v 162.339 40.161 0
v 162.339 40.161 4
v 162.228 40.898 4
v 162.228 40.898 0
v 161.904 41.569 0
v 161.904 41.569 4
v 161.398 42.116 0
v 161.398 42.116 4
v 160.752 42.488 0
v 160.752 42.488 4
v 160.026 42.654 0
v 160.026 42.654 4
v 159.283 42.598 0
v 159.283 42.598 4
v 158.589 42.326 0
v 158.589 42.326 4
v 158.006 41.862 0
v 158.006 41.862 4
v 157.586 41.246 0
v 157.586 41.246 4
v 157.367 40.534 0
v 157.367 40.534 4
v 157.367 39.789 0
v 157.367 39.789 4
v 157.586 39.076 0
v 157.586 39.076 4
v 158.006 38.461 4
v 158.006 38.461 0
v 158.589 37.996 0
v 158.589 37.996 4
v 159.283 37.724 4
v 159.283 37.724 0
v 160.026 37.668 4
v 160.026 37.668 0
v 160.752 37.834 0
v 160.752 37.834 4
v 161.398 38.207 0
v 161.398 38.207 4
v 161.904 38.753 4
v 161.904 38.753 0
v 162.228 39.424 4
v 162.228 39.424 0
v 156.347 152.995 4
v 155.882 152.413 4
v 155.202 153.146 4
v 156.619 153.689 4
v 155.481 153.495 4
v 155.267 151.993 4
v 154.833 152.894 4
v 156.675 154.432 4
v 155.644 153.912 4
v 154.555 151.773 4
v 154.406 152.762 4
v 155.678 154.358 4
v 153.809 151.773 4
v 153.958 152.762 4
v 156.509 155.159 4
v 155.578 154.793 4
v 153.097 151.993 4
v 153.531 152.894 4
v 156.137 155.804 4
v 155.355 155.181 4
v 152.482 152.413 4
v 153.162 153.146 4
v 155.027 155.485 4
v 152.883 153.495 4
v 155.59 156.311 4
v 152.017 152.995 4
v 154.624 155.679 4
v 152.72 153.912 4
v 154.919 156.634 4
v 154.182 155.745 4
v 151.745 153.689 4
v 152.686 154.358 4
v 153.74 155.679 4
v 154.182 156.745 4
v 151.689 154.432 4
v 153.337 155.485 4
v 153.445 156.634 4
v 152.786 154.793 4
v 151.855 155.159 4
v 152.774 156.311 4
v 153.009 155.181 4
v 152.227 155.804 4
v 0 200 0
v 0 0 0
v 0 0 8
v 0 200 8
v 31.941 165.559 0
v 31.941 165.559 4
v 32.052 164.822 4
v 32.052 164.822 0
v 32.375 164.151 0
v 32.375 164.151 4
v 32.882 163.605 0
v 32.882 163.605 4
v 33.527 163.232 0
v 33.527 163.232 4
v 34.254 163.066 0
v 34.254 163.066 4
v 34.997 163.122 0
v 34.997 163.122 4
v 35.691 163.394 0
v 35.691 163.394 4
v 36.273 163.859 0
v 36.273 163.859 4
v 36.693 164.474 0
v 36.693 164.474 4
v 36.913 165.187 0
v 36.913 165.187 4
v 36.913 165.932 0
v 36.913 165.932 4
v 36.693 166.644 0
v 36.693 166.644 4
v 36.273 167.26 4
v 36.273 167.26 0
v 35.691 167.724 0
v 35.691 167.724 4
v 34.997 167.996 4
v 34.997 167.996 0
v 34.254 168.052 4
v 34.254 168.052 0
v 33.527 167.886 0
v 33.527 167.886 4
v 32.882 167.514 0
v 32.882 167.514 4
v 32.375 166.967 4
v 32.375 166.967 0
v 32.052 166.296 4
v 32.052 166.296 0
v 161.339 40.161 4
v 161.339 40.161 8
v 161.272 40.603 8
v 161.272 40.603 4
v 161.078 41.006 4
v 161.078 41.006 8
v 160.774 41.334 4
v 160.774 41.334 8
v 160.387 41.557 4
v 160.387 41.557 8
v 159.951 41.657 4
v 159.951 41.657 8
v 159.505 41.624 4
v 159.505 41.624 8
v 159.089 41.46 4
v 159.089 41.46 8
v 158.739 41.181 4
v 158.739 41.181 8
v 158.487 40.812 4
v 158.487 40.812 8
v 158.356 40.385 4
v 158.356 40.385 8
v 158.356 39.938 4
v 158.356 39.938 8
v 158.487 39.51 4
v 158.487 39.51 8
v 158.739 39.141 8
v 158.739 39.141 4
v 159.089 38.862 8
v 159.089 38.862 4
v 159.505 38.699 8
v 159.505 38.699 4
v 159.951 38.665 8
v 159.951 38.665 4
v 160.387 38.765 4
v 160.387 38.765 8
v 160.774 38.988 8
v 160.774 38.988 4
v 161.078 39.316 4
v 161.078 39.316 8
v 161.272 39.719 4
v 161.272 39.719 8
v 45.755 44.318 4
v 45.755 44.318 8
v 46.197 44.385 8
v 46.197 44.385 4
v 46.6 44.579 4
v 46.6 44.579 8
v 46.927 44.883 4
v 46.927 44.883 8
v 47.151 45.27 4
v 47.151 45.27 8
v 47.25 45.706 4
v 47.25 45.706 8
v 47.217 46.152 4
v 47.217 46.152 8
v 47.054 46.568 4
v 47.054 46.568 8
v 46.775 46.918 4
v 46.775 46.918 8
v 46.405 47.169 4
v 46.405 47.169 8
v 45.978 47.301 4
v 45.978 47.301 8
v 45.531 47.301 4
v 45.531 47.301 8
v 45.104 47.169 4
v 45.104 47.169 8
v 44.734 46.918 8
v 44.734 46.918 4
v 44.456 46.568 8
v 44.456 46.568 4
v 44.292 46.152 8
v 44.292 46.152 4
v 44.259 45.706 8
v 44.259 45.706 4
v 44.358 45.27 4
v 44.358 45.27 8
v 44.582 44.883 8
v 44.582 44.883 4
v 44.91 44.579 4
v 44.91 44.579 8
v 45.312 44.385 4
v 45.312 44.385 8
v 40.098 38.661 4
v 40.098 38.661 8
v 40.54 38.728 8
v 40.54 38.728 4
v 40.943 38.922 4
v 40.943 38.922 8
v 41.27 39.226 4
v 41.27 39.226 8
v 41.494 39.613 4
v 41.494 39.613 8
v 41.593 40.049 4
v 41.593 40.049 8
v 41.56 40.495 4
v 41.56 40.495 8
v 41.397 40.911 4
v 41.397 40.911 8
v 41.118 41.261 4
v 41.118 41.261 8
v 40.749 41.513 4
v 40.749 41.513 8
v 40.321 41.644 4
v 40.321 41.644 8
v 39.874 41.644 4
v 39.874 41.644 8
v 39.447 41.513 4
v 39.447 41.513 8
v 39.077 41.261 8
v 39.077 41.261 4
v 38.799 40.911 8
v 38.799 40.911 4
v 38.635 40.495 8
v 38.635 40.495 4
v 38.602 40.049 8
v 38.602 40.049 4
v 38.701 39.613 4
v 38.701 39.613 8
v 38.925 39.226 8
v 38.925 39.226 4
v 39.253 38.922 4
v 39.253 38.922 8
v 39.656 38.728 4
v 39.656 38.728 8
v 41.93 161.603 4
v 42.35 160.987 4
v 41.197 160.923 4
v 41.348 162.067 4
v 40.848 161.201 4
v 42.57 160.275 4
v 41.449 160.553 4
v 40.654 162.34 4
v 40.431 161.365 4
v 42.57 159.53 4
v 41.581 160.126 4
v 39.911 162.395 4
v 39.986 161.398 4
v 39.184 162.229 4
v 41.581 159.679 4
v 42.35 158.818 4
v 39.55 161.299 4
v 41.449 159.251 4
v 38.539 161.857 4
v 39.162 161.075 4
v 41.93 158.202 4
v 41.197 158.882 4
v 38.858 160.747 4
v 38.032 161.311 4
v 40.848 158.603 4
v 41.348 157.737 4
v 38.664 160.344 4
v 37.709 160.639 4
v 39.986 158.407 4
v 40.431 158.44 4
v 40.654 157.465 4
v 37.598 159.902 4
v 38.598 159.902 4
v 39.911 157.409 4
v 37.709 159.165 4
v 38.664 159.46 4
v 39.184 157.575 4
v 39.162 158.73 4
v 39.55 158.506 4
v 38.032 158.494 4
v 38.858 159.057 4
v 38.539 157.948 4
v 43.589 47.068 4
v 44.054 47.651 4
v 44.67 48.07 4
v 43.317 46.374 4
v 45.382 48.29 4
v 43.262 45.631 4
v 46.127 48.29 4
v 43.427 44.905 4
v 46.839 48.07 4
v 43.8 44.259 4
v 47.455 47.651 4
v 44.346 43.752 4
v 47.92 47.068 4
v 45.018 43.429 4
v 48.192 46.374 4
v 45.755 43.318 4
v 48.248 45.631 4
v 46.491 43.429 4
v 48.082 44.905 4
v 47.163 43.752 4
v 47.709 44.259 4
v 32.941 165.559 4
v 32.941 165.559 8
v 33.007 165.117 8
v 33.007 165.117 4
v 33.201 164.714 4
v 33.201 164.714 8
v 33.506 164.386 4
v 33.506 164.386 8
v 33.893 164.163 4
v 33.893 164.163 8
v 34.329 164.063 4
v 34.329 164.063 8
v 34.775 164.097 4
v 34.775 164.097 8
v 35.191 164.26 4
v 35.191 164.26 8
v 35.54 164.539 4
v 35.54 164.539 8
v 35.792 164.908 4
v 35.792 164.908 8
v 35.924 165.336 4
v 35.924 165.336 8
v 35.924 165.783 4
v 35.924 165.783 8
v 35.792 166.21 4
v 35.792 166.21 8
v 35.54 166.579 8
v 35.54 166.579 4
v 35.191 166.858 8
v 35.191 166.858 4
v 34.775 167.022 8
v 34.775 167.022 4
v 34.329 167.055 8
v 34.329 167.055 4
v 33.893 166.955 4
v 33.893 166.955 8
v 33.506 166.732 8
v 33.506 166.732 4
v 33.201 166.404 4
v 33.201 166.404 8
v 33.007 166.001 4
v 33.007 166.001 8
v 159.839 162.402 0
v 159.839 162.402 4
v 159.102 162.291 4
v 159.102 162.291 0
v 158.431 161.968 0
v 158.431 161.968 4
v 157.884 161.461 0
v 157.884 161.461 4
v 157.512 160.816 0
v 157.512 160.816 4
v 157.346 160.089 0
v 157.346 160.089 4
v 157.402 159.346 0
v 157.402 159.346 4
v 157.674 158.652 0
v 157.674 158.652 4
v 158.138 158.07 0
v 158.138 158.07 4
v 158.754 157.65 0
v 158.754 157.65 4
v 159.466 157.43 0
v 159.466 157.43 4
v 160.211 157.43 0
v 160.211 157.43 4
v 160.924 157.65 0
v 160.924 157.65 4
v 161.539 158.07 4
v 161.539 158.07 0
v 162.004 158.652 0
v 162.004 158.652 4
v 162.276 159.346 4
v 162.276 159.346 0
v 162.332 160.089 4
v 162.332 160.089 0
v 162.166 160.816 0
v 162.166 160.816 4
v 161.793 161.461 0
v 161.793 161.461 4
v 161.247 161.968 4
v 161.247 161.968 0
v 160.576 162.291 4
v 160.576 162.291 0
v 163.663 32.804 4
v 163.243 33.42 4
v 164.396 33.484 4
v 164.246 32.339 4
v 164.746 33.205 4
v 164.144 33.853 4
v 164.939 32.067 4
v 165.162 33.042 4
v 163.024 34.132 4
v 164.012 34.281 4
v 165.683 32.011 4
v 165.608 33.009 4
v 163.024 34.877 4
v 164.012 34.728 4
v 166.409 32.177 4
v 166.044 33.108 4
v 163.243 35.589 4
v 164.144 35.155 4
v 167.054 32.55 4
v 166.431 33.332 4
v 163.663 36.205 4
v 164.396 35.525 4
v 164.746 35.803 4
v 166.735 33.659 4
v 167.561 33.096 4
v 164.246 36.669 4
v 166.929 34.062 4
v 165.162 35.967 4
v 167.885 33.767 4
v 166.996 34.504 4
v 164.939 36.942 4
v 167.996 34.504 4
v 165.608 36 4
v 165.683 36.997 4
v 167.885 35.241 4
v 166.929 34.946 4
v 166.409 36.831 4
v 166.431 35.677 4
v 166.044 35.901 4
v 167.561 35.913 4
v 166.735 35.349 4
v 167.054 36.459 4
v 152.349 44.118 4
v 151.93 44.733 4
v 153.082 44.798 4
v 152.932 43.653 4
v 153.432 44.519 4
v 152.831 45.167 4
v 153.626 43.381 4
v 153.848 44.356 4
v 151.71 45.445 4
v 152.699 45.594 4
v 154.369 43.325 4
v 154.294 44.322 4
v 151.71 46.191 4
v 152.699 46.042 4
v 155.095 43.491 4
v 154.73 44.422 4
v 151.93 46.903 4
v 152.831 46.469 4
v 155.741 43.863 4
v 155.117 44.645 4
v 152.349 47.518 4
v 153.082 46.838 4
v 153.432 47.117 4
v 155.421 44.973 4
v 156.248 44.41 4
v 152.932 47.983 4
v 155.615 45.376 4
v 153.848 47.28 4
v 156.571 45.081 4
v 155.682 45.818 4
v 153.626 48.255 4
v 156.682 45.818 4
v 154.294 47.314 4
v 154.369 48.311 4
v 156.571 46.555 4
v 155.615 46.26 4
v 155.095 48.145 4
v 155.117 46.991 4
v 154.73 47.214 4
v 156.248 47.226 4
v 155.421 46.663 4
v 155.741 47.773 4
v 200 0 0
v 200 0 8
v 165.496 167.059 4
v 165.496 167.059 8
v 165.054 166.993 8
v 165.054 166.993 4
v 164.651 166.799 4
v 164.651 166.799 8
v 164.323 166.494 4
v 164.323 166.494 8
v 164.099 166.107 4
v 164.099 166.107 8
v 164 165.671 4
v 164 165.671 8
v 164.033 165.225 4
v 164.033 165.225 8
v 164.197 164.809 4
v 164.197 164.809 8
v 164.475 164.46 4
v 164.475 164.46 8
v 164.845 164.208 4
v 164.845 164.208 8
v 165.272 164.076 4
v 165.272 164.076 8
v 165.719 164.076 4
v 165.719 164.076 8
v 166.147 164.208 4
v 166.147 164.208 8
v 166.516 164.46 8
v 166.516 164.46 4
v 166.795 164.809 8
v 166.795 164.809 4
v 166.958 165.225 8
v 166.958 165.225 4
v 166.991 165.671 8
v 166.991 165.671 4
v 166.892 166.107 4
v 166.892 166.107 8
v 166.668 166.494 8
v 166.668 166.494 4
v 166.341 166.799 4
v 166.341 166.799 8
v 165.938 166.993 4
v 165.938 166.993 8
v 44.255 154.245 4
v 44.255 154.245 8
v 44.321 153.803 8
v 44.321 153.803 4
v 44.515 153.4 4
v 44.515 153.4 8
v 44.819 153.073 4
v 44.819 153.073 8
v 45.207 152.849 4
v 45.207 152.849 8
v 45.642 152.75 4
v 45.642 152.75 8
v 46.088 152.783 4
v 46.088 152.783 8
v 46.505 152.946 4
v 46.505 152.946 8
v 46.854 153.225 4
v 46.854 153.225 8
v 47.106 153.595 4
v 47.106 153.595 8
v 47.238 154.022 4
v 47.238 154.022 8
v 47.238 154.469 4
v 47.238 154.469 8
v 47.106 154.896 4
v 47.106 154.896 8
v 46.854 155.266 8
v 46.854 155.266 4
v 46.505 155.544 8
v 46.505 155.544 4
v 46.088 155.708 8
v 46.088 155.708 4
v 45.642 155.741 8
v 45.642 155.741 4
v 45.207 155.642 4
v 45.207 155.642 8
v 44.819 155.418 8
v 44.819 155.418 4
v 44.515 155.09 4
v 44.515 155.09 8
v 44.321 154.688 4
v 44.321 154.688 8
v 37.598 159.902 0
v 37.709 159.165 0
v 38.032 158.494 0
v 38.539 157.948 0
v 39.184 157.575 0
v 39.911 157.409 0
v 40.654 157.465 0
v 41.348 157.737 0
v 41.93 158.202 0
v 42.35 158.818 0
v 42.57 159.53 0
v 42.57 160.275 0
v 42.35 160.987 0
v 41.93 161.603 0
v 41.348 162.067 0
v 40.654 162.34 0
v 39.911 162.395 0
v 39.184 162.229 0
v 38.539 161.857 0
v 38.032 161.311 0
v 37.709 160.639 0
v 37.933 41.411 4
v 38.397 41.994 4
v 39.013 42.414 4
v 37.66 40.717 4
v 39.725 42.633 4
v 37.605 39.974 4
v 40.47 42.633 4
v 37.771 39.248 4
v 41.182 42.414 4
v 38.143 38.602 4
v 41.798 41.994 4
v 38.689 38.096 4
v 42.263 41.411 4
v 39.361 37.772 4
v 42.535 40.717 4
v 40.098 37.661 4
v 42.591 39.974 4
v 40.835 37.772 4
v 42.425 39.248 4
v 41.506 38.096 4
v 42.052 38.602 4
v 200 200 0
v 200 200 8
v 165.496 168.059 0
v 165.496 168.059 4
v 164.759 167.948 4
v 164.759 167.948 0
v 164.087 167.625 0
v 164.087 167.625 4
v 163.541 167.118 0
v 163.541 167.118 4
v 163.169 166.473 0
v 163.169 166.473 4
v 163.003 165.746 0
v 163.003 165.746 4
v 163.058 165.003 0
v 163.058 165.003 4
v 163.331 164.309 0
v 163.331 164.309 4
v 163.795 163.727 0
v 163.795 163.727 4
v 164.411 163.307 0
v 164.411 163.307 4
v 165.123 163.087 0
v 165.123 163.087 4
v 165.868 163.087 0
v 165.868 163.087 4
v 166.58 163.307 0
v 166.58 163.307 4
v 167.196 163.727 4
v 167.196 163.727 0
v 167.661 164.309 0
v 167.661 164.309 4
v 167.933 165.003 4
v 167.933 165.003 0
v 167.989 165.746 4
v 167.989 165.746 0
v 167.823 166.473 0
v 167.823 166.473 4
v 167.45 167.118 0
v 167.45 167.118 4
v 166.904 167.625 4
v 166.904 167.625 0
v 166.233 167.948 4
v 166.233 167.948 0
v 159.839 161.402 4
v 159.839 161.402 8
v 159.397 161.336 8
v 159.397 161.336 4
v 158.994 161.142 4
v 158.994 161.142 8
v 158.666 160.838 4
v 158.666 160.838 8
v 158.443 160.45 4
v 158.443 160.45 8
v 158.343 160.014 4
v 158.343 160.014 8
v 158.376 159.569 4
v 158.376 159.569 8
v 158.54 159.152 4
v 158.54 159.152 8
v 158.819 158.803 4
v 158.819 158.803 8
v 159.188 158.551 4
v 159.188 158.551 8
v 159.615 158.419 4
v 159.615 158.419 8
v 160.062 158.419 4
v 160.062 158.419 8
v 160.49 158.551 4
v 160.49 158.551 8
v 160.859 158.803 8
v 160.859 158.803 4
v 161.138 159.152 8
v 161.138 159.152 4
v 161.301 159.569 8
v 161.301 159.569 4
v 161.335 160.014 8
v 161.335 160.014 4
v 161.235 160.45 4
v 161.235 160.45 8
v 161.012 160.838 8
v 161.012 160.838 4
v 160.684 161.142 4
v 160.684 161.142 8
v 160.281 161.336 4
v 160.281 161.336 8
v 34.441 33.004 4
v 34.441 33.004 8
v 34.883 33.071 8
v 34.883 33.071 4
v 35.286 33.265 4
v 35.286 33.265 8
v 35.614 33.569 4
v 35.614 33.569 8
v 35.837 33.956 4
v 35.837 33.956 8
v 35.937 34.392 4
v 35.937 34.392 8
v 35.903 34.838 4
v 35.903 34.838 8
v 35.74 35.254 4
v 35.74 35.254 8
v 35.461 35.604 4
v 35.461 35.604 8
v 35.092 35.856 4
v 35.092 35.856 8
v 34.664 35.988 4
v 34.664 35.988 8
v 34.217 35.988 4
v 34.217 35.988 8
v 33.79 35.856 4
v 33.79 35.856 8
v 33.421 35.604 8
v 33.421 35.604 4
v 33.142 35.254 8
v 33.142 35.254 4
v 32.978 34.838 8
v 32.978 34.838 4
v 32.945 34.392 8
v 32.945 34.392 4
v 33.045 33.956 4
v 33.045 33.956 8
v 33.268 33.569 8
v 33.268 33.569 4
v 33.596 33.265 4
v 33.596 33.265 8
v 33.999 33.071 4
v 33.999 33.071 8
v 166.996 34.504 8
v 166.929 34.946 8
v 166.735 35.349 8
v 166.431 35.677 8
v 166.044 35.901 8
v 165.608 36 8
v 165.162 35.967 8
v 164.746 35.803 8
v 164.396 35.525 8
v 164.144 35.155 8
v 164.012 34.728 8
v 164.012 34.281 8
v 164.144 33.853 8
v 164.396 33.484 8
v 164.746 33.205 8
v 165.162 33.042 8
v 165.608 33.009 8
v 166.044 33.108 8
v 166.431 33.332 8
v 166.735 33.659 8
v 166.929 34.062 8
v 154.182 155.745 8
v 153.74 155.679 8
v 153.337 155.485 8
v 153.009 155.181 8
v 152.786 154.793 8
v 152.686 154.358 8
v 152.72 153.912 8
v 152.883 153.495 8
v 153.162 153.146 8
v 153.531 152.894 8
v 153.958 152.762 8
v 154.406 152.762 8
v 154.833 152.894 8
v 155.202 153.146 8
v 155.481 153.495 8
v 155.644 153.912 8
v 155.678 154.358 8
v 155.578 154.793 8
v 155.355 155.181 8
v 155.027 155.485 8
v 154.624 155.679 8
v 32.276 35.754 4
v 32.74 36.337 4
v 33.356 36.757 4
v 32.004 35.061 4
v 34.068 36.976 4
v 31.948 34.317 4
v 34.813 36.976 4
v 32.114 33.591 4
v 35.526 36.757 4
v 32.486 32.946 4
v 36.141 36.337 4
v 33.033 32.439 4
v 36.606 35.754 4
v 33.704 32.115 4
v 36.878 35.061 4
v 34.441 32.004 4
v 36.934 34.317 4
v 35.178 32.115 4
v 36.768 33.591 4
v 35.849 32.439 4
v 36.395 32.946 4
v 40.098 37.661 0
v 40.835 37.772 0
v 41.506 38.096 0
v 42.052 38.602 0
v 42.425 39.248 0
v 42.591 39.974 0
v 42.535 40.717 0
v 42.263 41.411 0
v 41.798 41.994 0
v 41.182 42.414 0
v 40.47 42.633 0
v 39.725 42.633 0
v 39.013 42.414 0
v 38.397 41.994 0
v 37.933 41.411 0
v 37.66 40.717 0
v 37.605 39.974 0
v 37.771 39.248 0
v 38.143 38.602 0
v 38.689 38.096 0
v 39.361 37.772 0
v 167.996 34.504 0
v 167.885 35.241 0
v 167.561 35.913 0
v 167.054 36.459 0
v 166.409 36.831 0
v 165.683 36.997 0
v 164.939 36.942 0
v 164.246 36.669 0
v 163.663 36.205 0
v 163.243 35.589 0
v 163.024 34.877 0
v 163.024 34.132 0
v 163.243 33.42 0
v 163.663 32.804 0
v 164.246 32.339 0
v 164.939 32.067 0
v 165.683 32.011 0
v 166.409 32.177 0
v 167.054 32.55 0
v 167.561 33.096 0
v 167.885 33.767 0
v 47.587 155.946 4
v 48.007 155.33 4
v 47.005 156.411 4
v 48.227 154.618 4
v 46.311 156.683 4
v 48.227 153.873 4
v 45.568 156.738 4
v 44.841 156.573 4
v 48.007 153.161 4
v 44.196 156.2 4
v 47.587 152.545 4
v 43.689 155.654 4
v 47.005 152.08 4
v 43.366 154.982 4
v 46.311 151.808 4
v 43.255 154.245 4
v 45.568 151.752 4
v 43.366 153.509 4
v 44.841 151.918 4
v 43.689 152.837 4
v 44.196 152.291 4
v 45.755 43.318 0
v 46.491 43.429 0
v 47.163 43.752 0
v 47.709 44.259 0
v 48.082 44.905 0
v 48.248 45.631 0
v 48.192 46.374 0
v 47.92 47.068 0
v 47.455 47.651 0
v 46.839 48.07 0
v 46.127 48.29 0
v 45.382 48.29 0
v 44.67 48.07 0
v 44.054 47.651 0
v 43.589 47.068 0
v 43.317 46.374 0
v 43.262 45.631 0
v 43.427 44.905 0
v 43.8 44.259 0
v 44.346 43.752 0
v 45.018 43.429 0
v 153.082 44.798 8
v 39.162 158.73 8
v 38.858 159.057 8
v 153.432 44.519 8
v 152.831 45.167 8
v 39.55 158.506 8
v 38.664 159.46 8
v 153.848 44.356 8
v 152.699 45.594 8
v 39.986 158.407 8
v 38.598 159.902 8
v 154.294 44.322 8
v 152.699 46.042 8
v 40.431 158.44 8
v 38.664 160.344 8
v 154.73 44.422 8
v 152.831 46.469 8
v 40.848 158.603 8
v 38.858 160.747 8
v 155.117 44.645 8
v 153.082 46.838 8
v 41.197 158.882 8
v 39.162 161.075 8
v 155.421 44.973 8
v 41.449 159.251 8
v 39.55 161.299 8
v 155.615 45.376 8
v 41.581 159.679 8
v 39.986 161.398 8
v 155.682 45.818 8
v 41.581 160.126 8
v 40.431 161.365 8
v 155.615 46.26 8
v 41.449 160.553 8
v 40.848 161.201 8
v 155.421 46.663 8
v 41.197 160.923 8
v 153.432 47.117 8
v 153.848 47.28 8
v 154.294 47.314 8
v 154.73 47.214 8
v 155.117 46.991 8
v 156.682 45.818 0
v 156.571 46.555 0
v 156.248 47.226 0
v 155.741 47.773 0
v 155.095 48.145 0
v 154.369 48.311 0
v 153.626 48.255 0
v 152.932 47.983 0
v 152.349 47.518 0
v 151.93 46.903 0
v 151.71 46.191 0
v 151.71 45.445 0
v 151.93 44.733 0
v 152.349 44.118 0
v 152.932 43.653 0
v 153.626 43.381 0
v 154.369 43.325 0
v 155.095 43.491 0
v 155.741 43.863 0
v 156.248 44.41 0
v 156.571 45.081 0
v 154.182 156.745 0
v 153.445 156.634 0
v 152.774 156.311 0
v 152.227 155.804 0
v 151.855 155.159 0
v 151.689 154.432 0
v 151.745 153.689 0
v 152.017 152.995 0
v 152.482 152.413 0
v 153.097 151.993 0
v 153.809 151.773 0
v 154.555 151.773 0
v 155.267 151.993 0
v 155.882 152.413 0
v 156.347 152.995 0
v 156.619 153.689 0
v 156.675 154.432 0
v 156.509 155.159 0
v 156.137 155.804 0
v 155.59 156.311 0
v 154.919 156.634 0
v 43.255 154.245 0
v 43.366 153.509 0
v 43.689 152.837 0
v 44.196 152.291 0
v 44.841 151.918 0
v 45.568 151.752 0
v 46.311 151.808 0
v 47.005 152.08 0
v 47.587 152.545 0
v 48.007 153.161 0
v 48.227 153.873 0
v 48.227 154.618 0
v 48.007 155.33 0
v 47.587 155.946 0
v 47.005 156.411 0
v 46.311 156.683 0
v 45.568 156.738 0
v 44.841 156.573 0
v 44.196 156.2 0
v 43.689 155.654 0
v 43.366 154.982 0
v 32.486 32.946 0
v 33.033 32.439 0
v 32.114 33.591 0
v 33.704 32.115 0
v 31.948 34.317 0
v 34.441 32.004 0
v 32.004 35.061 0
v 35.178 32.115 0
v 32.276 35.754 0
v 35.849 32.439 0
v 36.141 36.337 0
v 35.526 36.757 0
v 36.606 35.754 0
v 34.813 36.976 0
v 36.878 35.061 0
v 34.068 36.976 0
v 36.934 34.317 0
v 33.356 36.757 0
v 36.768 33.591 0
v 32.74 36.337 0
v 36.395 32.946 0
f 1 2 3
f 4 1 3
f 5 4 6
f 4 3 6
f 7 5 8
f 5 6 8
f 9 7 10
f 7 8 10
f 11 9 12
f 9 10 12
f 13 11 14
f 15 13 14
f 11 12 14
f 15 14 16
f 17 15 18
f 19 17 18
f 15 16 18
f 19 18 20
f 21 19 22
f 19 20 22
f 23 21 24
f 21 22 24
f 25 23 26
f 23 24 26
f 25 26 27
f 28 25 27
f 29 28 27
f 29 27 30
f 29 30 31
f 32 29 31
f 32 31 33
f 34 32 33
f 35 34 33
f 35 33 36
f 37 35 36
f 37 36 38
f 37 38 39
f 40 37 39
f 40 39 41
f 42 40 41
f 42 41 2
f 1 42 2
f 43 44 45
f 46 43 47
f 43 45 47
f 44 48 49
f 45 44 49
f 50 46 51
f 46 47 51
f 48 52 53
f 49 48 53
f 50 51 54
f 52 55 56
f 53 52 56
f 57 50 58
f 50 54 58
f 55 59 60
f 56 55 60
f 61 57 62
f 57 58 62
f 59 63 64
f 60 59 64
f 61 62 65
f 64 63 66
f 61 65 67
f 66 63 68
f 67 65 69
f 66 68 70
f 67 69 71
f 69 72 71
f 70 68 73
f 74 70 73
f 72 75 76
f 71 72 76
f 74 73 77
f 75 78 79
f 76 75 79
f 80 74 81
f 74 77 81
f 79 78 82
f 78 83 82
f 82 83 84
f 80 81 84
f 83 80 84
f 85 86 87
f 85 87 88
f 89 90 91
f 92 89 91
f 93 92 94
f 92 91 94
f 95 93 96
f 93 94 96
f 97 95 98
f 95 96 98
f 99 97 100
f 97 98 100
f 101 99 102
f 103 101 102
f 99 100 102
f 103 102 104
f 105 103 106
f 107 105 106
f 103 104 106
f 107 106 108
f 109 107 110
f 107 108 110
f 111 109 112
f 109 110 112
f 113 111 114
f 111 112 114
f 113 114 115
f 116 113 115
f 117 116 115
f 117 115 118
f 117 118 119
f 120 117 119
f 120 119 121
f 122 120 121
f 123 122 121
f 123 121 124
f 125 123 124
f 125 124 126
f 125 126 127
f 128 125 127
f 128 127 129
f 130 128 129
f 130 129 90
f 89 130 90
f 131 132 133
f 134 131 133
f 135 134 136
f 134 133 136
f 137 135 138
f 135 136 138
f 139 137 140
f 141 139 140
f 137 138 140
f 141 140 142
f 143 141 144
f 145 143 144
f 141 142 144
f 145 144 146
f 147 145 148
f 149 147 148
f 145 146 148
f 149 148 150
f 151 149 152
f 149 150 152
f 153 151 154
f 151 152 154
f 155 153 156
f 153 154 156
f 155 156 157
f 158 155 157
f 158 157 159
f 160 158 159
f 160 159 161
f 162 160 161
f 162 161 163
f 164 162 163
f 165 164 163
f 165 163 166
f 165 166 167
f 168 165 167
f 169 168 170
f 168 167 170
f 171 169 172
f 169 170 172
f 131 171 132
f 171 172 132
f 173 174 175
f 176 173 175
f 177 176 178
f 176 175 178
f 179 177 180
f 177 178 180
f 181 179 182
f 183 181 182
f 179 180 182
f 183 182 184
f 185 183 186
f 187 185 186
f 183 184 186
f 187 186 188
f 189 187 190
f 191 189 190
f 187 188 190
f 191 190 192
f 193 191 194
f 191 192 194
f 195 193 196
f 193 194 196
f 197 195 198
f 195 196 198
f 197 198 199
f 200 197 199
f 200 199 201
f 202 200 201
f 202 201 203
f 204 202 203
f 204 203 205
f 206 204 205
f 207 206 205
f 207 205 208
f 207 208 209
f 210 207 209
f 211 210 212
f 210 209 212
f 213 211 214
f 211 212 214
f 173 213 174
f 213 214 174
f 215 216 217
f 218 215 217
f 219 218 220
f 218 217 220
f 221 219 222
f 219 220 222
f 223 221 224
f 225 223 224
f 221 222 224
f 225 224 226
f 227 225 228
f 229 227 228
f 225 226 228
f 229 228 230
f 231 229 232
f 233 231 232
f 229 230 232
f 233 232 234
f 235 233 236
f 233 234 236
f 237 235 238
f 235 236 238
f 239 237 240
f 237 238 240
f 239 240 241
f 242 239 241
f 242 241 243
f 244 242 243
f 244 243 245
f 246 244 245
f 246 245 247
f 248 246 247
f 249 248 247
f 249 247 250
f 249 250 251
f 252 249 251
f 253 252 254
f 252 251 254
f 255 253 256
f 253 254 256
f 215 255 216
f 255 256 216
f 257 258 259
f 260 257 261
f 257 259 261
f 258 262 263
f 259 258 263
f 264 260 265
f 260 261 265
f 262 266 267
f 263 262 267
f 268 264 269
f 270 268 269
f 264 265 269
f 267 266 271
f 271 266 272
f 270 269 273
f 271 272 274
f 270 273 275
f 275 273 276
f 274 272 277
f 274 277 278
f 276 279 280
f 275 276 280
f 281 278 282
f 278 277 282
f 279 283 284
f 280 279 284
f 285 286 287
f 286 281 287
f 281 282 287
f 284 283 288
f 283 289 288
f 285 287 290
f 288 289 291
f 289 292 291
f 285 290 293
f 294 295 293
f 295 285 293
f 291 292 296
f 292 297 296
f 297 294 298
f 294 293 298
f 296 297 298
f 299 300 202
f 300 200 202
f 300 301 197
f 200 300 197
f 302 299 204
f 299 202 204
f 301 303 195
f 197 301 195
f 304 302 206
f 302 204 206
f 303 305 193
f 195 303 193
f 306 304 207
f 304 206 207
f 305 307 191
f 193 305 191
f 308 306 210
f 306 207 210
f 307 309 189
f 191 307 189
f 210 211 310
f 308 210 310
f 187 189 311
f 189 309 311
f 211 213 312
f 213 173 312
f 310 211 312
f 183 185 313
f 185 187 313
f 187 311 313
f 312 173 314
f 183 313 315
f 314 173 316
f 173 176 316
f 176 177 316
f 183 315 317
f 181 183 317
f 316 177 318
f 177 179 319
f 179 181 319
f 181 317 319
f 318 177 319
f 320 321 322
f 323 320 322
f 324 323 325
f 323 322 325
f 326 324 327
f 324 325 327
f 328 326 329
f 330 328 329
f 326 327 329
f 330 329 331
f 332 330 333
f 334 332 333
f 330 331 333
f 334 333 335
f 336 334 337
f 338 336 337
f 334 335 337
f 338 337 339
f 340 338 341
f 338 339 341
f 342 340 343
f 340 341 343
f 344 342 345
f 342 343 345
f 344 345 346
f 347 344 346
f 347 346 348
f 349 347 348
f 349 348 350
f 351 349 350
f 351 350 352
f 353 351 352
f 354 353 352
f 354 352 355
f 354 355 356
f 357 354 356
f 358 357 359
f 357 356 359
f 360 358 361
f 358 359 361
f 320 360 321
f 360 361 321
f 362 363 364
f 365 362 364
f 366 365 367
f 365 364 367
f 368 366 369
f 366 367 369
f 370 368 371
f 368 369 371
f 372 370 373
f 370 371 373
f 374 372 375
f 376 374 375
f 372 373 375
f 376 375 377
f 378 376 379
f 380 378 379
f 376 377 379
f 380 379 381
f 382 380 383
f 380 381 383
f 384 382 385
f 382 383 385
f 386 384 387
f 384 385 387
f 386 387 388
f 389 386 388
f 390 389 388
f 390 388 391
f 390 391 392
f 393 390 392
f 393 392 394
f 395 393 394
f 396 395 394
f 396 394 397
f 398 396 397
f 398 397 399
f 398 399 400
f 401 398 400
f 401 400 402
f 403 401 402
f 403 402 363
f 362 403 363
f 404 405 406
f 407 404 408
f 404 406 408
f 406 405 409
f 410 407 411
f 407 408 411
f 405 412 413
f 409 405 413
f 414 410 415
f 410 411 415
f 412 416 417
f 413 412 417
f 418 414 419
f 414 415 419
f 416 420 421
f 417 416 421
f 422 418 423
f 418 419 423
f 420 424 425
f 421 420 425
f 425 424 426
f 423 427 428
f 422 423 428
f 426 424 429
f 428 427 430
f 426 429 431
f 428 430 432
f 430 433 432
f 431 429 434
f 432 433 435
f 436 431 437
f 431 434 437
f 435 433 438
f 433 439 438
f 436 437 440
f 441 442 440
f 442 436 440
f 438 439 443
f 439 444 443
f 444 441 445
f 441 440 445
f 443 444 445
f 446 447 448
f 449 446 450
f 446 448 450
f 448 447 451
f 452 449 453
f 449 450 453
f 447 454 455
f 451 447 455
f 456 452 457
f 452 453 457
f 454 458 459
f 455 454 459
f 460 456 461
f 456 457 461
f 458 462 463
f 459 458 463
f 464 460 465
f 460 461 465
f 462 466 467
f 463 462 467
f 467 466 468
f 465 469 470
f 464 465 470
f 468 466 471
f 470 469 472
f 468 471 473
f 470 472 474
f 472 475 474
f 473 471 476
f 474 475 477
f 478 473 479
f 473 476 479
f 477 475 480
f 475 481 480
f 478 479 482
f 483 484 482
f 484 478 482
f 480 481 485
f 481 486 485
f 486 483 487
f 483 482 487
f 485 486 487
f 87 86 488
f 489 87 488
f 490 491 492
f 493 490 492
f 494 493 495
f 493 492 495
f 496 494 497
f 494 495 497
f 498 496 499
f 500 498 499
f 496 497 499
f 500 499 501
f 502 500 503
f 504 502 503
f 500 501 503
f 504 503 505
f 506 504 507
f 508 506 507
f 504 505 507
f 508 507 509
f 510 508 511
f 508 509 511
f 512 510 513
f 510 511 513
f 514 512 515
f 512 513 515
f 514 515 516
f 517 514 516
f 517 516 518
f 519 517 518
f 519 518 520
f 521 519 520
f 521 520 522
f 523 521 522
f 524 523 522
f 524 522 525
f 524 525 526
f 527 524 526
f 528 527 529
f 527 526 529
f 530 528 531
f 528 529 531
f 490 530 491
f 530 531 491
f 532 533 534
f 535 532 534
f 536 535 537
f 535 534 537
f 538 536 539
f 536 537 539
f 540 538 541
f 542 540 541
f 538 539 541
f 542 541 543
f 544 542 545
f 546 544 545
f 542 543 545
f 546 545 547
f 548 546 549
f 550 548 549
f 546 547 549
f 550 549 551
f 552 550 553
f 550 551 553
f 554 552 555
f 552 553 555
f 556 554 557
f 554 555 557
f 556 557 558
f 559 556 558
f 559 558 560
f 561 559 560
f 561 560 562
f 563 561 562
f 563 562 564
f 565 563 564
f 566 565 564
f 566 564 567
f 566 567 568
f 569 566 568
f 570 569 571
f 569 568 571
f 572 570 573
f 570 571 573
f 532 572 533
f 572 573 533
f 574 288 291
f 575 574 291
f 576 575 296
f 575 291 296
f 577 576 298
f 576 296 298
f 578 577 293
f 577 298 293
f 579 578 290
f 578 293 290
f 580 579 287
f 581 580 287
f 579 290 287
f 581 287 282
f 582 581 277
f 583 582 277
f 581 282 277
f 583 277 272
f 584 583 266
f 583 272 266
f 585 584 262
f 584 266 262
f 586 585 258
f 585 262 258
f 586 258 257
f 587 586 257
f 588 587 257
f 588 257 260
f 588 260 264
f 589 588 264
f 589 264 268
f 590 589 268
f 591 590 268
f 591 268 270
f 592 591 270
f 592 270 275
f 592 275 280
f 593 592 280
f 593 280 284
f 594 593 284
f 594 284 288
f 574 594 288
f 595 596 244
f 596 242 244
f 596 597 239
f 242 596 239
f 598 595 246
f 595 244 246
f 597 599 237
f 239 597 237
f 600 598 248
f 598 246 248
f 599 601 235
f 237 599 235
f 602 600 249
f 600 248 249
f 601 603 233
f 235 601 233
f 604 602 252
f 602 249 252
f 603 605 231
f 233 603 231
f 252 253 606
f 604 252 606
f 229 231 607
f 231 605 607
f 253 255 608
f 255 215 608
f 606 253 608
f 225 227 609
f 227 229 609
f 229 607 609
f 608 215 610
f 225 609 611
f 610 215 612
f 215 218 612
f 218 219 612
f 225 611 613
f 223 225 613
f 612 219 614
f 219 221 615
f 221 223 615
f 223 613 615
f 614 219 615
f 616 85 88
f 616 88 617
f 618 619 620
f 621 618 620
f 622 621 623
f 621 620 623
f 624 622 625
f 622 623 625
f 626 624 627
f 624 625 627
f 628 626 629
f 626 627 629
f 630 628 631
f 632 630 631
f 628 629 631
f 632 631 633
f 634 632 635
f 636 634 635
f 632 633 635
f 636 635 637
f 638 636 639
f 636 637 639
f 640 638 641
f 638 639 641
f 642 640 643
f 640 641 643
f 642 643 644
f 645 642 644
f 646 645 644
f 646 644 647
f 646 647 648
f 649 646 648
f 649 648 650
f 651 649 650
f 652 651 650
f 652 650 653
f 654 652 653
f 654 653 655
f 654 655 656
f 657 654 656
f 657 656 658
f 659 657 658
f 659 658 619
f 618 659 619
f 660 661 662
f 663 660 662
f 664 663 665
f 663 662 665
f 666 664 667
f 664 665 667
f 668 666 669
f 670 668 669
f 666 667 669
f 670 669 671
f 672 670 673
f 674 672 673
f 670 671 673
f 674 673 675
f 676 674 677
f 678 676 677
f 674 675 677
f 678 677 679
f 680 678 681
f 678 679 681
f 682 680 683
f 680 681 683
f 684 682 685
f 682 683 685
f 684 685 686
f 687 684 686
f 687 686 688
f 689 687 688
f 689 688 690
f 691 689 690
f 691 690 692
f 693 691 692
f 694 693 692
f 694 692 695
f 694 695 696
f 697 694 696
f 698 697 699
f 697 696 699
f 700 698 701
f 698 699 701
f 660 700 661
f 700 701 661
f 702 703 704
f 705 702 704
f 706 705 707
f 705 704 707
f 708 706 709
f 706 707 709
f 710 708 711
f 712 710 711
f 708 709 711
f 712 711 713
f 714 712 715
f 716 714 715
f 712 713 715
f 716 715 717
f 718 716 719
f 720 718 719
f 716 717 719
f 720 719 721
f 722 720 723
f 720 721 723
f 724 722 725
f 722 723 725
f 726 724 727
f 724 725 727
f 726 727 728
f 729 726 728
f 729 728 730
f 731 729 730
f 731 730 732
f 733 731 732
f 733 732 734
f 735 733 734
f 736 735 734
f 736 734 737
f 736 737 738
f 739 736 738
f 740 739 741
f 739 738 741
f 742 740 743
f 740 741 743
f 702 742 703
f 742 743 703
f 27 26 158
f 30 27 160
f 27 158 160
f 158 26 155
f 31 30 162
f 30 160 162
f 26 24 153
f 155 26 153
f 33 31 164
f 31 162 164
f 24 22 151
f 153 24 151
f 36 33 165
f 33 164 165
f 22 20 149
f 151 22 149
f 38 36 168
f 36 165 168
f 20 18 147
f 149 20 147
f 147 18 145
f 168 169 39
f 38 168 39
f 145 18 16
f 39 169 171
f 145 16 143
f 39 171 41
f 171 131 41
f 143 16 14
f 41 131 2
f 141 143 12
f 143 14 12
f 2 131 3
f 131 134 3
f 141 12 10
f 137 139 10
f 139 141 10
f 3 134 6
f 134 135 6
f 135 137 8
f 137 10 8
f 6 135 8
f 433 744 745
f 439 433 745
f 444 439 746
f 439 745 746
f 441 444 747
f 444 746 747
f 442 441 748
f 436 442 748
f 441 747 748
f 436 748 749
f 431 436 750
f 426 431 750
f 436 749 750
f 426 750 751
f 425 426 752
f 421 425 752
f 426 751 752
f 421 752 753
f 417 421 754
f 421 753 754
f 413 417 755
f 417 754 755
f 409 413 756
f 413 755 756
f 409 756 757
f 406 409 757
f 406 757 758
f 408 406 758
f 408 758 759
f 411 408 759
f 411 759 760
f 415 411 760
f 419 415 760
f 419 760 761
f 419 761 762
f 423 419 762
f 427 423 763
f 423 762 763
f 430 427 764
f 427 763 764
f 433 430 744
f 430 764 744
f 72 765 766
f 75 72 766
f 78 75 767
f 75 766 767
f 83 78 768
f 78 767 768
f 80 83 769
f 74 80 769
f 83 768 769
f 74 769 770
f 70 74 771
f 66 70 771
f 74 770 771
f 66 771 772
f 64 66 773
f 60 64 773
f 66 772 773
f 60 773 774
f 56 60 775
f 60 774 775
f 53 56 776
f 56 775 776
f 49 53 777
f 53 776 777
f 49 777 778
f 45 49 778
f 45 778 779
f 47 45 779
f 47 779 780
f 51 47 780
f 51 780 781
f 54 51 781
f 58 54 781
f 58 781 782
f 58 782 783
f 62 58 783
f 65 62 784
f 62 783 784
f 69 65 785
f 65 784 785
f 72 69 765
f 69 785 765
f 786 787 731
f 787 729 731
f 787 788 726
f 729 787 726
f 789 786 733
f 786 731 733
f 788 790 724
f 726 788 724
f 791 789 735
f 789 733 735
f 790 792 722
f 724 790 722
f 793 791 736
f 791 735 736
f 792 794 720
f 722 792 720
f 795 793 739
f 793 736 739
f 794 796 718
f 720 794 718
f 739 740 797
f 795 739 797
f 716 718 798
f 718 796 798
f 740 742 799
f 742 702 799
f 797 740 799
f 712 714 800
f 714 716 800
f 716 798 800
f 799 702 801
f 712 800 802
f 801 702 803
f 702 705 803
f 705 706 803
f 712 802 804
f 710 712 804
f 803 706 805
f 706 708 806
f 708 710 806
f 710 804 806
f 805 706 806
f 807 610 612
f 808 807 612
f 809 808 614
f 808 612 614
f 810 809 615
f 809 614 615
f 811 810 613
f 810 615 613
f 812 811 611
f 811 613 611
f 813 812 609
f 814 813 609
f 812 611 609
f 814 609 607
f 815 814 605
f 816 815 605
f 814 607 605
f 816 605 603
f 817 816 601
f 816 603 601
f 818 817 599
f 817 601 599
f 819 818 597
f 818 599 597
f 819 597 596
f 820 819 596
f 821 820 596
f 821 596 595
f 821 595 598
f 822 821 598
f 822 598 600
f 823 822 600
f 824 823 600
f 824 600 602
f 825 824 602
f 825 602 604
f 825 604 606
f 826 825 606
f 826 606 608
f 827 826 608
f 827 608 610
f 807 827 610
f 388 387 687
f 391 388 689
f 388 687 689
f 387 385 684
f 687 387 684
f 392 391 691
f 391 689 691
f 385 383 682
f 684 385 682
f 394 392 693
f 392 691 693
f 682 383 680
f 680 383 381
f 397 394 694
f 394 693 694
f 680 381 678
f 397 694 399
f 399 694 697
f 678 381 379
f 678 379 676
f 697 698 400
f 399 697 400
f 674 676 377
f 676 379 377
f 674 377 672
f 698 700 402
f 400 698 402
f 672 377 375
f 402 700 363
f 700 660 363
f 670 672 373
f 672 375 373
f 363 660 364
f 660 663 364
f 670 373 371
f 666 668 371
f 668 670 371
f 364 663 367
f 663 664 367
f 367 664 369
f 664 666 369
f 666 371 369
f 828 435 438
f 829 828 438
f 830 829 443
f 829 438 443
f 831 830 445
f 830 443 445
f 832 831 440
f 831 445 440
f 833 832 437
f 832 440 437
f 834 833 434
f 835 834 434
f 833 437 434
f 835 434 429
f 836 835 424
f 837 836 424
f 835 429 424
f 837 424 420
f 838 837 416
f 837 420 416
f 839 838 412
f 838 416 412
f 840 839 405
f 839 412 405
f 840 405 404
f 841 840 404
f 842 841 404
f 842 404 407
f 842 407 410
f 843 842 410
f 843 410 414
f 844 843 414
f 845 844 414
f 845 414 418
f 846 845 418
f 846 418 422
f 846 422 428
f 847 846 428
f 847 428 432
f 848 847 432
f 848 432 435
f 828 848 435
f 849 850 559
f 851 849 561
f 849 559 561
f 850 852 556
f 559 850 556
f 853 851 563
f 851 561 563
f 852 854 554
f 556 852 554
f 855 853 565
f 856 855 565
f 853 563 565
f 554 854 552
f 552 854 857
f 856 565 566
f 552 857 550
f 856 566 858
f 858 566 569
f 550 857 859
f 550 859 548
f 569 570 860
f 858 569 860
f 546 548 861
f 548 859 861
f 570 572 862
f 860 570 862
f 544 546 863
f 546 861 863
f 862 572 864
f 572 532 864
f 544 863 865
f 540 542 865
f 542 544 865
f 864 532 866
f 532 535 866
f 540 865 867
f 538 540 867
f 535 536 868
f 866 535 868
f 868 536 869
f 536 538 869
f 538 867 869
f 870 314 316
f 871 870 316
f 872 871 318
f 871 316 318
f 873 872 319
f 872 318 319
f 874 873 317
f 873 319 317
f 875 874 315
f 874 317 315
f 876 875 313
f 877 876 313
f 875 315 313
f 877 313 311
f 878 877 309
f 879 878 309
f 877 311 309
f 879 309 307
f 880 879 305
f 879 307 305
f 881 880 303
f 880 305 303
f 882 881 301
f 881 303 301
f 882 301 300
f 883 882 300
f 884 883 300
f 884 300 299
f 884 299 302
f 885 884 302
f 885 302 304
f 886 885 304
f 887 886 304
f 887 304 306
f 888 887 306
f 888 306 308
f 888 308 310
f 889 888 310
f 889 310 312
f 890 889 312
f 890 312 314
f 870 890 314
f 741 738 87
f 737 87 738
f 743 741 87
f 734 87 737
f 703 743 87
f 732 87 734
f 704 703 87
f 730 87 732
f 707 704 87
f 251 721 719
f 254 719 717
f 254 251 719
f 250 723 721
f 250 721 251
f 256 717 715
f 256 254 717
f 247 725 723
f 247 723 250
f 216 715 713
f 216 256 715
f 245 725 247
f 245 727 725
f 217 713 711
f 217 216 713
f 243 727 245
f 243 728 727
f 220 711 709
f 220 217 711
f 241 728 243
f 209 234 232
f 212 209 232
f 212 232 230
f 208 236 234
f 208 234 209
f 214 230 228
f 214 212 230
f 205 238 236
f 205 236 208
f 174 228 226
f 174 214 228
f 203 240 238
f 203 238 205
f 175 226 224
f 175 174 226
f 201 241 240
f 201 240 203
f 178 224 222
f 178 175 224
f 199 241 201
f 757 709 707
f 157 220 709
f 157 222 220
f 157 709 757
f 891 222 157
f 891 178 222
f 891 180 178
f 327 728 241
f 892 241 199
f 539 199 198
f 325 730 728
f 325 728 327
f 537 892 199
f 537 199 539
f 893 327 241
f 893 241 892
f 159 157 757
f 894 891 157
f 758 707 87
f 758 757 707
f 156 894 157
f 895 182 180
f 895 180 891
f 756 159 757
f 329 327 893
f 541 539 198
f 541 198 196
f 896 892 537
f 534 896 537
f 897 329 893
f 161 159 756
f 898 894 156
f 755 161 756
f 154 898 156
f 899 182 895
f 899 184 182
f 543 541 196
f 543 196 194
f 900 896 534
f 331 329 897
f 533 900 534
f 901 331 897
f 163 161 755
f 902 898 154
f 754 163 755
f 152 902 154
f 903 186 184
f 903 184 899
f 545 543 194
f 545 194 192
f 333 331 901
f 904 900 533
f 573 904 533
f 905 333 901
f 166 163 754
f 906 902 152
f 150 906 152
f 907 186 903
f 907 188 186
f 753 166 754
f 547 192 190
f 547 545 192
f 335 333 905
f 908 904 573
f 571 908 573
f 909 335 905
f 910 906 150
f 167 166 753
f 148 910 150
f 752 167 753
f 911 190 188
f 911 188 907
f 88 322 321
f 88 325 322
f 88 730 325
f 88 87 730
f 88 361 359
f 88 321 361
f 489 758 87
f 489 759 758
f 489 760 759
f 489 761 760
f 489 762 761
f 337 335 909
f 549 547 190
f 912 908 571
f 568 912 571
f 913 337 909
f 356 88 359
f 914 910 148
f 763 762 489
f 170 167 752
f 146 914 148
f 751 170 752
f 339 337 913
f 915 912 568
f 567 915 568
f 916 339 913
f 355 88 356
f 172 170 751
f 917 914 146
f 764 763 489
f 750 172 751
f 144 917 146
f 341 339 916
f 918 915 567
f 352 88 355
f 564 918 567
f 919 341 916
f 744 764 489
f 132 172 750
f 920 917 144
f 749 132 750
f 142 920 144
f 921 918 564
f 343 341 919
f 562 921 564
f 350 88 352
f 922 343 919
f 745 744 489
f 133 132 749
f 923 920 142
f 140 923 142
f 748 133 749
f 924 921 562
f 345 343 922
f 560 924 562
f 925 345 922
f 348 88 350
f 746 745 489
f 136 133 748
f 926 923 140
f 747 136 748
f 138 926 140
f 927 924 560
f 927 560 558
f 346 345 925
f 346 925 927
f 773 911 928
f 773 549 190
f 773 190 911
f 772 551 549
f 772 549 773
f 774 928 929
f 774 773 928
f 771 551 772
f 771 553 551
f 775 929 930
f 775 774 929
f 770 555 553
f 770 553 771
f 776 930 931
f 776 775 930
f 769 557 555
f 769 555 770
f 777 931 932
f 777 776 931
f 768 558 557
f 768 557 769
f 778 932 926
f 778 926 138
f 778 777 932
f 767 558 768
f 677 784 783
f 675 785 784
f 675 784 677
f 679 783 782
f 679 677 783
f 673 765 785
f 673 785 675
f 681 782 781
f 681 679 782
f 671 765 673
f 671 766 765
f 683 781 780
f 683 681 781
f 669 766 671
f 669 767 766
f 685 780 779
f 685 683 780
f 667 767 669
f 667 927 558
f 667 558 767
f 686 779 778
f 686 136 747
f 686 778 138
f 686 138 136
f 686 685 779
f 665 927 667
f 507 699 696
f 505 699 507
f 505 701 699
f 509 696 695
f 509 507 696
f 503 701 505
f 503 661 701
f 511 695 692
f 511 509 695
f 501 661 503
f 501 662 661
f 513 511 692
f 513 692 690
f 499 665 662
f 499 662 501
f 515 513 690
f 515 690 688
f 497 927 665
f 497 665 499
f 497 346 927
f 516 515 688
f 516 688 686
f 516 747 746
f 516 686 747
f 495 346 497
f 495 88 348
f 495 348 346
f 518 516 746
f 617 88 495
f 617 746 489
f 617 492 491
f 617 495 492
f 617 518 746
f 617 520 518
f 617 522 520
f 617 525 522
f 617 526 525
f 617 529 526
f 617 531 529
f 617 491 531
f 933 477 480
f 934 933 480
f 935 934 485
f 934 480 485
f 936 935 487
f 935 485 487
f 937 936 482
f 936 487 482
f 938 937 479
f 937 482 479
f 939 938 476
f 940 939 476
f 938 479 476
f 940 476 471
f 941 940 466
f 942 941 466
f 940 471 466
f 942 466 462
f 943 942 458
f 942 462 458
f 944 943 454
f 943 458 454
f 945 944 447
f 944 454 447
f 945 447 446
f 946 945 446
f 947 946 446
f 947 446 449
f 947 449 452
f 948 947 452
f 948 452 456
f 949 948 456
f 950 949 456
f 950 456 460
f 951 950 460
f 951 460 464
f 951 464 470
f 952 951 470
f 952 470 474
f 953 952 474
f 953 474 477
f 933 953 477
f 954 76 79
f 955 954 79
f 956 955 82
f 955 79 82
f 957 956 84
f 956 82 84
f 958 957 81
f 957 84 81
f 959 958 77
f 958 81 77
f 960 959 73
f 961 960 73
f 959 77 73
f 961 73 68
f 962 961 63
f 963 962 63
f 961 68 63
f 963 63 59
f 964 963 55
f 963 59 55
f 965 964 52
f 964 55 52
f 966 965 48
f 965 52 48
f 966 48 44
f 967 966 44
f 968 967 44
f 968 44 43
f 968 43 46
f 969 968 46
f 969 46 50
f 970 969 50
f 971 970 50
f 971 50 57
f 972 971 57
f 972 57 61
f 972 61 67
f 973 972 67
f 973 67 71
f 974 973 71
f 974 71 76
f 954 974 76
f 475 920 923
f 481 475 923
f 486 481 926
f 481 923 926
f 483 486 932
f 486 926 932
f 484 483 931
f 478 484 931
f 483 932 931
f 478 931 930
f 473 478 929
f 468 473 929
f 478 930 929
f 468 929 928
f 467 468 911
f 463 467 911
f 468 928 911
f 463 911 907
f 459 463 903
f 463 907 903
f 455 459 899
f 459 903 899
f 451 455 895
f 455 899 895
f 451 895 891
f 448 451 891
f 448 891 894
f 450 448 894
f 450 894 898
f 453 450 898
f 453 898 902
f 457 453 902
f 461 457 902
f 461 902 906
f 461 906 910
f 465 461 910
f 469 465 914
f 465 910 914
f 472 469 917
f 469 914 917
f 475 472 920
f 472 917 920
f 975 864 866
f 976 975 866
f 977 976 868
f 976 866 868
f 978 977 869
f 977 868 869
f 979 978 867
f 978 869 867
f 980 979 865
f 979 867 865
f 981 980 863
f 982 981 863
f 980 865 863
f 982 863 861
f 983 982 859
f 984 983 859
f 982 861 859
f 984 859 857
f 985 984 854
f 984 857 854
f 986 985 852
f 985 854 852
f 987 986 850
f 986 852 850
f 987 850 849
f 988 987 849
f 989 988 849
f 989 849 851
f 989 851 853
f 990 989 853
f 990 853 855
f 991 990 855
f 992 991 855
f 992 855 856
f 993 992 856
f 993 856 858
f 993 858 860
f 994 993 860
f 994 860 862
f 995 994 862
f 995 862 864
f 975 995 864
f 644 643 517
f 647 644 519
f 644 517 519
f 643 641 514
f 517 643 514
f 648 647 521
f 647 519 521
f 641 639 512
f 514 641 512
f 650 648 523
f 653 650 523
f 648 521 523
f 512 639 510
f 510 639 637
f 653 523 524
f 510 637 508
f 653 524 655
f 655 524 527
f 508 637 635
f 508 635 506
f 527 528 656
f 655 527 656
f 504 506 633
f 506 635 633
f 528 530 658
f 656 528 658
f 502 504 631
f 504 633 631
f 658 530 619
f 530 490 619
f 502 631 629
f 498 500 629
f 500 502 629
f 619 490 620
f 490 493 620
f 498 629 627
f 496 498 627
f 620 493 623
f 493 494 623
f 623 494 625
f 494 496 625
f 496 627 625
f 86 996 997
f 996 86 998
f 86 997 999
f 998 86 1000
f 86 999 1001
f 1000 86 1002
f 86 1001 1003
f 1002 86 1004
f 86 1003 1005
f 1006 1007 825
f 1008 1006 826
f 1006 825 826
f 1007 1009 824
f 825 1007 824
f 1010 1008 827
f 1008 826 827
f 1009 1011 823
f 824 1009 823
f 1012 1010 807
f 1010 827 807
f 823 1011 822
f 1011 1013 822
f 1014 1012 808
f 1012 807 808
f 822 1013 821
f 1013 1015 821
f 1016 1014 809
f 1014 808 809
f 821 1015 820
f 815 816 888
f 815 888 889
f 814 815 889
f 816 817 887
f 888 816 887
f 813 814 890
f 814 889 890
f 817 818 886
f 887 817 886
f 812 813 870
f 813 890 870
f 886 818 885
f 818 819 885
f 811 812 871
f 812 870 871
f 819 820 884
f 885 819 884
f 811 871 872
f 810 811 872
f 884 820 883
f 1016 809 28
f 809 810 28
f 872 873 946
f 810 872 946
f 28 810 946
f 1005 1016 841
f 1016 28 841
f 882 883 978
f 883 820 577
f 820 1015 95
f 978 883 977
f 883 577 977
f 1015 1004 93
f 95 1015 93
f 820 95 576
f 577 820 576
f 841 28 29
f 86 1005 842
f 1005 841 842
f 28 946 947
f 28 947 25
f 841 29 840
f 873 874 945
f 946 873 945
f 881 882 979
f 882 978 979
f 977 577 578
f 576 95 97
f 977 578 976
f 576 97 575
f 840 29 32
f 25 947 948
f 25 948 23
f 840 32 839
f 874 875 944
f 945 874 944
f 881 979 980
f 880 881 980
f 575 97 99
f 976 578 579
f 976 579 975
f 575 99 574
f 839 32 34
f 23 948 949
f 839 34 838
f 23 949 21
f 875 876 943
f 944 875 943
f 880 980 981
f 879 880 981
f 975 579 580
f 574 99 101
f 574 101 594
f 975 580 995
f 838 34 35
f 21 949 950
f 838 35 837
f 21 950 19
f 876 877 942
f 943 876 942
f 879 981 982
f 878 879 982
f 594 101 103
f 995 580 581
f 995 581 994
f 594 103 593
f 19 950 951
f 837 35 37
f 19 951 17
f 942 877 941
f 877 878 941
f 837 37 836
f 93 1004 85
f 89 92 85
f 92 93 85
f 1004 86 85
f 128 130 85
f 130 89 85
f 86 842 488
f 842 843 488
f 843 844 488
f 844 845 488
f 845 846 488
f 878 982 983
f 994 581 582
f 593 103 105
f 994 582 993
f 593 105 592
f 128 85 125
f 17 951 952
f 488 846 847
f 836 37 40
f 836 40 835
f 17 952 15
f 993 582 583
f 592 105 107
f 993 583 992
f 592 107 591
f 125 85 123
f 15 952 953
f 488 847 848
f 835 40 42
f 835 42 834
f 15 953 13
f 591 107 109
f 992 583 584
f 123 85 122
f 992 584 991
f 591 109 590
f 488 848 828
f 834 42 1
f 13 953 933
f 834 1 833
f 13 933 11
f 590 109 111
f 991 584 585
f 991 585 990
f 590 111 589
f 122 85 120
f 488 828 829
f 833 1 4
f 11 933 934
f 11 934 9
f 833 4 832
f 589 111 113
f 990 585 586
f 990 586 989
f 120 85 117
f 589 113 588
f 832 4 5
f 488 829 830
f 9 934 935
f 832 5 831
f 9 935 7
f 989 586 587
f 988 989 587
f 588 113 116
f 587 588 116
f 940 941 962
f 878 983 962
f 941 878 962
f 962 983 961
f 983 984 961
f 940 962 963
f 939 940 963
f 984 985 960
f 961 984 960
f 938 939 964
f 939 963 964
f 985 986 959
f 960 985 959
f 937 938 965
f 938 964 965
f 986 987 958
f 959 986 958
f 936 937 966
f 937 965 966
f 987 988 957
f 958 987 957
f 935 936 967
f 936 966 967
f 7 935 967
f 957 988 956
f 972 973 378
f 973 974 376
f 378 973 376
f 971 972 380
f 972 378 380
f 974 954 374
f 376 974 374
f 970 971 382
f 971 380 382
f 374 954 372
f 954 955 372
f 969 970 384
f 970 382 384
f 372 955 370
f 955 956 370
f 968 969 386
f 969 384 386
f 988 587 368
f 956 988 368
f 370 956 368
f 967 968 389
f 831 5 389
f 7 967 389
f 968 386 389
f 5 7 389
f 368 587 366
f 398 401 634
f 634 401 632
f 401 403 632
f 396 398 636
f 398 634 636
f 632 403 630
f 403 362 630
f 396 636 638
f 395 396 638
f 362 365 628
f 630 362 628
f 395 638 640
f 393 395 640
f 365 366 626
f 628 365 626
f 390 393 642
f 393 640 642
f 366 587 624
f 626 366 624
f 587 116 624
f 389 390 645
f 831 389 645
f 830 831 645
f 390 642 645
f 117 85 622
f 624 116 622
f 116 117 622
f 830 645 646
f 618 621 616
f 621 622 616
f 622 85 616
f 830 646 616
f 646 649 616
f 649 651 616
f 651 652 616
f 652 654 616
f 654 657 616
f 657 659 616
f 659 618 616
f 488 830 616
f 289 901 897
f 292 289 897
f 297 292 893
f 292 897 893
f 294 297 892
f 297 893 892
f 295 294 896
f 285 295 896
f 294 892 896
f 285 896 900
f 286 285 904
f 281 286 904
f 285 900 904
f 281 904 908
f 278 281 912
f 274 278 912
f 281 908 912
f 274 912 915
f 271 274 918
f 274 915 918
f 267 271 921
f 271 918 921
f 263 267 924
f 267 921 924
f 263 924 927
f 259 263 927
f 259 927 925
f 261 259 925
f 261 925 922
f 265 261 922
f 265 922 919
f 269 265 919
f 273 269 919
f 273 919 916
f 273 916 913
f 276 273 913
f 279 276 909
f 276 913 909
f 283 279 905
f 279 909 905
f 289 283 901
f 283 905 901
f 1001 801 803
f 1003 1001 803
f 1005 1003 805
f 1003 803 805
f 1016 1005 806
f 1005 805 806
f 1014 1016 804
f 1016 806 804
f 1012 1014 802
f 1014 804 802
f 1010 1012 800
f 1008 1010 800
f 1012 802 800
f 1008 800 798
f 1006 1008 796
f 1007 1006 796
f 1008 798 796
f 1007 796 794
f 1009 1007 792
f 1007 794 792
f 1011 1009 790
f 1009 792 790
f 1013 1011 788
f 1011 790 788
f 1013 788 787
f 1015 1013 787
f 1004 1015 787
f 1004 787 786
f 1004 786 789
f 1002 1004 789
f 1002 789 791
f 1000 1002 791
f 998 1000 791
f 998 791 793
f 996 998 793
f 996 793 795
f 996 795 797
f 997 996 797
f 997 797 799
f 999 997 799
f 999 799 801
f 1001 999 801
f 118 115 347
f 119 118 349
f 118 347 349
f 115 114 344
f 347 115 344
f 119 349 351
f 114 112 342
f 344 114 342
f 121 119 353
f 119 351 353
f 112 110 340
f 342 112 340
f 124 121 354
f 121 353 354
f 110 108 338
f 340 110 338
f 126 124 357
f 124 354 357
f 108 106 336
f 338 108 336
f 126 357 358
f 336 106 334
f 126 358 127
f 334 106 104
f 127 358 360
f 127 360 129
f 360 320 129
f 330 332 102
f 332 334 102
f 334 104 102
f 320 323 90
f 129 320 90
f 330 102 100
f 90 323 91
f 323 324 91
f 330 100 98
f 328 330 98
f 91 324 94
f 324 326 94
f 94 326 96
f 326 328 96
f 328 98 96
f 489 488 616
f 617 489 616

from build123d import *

# Parameters (mm, degrees)
SKETCH1_W           = 200
SKETCH1_H           = 200
BOSS_EXTRUDE1_DEPTH = 8
SKETCH3_R           = 1.5
CUT_EXTRUDE1_DEPTH  = 4
SKETCH4_R           = 2.5
CUT_EXTRUDE2_DEPTH  = 10
CIRPATTERN1_COUNT   = 4


with BuildPart() as part:
    # Sketch1 → Boss-Extrude1 (new body)
    with BuildSketch(Plane.XY):
        with Locations((100, 100)):
            Rectangle(SKETCH1_W, SKETCH1_H)
    extrude(amount=BOSS_EXTRUDE1_DEPTH)

    # Sketch3 → Cut-Extrude1 (cut)
    with BuildSketch(Plane.XY.offset(8)):
        with Locations((165.495689012, 34.504310988)):
            Circle(SKETCH3_R)
        with Locations((159.838834762, 40.161165238)):
            Circle(SKETCH3_R)
        with Locations((154.181980513, 45.818019487)):
            Circle(SKETCH3_R)
    cut_extrude1 = extrude(amount=-CUT_EXTRUDE1_DEPTH, mode=Mode.SUBTRACT)

    # Sketch4 → Cut-Extrude2 (cut)
    with BuildSketch(Plane.XY.offset(4)):
        with Locations((154.181980513, 45.818019487)):
            Circle(SKETCH4_R)
        with Locations((159.838834762, 40.161165238)):
            Circle(SKETCH4_R)
        with Locations((165.495689012, 34.504310988)):
            Circle(SKETCH4_R)
    cut_extrude2 = extrude(amount=-CUT_EXTRUDE2_DEPTH, mode=Mode.SUBTRACT)

    # CirPattern1: Cut-Extrude1, Cut-Extrude2 ×4 about axis
    cirpattern1_axis = Axis((99.968259988, 100.031740012, 8), (0, 0, 1))
    add([cut_extrude1.rotate(cirpattern1_axis, i * 360 / CIRPATTERN1_COUNT) for i in range(1, CIRPATTERN1_COUNT)], mode=Mode.SUBTRACT)
    add([cut_extrude2.rotate(cirpattern1_axis, i * 360 / CIRPATTERN1_COUNT) for i in range(1, CIRPATTERN1_COUNT)], mode=Mode.SUBTRACT)


solid = part.part
